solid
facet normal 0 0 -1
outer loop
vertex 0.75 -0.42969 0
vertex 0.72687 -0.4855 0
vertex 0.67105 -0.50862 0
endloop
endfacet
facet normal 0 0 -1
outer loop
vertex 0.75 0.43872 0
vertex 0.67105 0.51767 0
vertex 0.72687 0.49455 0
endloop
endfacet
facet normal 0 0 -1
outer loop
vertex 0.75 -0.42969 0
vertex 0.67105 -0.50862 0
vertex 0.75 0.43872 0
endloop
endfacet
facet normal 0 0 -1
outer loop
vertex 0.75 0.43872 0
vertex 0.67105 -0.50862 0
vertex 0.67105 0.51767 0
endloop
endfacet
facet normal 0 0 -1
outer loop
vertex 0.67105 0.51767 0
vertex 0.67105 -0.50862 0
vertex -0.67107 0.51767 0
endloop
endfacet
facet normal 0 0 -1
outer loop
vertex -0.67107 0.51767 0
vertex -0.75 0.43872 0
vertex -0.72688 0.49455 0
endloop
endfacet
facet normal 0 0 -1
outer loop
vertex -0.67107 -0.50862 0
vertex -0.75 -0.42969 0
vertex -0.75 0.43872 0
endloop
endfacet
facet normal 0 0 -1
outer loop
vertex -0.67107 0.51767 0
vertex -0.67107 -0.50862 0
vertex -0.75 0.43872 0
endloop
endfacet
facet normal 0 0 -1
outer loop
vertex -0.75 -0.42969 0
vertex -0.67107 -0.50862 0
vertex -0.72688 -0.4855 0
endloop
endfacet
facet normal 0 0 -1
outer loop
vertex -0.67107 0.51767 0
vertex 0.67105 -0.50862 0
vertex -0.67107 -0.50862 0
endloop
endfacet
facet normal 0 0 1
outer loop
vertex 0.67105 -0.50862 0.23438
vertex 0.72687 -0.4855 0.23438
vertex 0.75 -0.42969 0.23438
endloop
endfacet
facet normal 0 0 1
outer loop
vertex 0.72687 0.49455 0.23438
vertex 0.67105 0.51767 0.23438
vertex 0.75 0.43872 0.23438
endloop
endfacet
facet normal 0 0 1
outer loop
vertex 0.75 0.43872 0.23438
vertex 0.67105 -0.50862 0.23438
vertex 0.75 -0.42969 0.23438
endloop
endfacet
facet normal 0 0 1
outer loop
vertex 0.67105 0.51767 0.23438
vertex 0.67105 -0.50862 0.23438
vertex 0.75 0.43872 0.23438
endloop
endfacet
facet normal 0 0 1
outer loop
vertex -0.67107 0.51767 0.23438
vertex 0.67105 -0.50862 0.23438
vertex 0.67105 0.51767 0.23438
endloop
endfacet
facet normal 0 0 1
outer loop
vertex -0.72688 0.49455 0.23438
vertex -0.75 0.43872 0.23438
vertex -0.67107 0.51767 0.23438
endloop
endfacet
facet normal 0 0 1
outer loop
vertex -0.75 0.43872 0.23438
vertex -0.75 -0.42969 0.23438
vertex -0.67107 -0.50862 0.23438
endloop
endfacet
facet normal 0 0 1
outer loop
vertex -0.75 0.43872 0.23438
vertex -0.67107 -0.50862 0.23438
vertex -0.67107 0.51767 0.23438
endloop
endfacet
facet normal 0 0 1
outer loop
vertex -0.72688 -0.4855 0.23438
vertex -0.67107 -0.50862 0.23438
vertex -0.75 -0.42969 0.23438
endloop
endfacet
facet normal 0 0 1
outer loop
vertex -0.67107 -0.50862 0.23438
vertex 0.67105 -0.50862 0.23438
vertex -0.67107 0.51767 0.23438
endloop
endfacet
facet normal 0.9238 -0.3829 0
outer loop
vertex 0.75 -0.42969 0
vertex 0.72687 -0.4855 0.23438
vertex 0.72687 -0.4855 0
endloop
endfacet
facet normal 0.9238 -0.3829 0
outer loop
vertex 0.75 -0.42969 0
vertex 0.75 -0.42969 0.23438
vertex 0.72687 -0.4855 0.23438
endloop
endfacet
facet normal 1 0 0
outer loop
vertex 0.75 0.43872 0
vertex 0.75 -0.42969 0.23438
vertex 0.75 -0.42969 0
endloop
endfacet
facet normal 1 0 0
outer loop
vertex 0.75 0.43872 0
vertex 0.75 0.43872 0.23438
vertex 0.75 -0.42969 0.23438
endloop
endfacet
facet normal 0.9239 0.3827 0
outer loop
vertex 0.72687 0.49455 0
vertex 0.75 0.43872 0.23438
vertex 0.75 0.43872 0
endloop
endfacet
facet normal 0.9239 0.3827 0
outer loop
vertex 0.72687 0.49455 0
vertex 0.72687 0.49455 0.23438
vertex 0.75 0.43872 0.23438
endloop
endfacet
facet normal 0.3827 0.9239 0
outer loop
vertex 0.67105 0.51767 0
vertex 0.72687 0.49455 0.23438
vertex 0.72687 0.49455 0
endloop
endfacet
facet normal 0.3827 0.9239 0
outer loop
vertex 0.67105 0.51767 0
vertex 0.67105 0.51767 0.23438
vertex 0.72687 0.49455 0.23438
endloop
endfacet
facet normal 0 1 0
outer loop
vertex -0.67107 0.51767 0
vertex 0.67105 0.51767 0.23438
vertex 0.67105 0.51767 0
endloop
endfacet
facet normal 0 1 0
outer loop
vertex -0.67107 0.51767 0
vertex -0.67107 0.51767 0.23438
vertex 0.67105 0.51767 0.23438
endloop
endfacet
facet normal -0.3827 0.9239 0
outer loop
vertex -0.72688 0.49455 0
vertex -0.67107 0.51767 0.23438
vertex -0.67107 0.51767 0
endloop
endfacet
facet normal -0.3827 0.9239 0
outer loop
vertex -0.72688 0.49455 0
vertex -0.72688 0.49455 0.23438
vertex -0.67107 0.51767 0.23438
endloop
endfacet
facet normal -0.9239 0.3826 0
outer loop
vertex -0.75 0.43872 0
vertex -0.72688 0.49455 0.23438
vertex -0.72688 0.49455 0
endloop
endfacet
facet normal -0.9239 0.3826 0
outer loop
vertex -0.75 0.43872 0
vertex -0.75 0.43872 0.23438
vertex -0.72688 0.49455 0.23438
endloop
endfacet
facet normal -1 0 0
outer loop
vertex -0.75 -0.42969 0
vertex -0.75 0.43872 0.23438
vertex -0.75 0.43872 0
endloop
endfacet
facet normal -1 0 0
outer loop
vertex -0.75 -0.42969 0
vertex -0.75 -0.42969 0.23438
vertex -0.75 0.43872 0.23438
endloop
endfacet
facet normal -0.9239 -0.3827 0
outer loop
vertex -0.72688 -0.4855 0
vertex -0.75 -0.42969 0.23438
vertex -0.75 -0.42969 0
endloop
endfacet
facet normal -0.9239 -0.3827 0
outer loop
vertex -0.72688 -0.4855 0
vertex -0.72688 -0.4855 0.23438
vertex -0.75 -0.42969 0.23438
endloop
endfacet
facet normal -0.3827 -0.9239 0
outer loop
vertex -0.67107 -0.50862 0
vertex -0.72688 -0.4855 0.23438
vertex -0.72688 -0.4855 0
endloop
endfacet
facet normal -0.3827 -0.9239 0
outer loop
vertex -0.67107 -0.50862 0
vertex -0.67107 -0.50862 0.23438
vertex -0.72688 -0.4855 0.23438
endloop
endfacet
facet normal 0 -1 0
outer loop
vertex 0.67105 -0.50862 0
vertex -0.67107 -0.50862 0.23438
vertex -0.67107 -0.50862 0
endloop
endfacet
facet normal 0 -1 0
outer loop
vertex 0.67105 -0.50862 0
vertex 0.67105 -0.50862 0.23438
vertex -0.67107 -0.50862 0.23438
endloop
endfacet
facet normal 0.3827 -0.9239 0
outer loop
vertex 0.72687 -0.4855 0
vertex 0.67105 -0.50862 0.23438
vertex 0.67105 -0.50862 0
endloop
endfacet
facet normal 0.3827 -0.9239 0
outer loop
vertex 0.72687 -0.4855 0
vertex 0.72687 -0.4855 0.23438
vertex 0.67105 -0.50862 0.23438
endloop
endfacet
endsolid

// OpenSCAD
EPS = 0.01;

translate([-0.75, -0.4296875, 0.0])
rotate([0, 0, 0])
linear_extrude(height=0.234375)
    polygon(points=[
        [0.0, 0.0],
        [0.023123148853693615, -0.05582421956735902],
        [0.07894736842105263, -0.07894736842105263],
        [1.4210526315789473, -0.07894736842105263],
        [1.4768768511463064, -0.05582421956735902],
        [1.5, 0.0],
        [1.5, 0.868421052631579],
        [1.4768768511463064, 0.924245272198938],
        [1.4210526315789473, 0.9473684210526316],
        [0.07894736842105263, 0.9473684210526316],
        [0.023123148853693615, 0.924245272198938],
        [0.0, 0.868421052631579],
        [0.0, 0.0]
    ]);
